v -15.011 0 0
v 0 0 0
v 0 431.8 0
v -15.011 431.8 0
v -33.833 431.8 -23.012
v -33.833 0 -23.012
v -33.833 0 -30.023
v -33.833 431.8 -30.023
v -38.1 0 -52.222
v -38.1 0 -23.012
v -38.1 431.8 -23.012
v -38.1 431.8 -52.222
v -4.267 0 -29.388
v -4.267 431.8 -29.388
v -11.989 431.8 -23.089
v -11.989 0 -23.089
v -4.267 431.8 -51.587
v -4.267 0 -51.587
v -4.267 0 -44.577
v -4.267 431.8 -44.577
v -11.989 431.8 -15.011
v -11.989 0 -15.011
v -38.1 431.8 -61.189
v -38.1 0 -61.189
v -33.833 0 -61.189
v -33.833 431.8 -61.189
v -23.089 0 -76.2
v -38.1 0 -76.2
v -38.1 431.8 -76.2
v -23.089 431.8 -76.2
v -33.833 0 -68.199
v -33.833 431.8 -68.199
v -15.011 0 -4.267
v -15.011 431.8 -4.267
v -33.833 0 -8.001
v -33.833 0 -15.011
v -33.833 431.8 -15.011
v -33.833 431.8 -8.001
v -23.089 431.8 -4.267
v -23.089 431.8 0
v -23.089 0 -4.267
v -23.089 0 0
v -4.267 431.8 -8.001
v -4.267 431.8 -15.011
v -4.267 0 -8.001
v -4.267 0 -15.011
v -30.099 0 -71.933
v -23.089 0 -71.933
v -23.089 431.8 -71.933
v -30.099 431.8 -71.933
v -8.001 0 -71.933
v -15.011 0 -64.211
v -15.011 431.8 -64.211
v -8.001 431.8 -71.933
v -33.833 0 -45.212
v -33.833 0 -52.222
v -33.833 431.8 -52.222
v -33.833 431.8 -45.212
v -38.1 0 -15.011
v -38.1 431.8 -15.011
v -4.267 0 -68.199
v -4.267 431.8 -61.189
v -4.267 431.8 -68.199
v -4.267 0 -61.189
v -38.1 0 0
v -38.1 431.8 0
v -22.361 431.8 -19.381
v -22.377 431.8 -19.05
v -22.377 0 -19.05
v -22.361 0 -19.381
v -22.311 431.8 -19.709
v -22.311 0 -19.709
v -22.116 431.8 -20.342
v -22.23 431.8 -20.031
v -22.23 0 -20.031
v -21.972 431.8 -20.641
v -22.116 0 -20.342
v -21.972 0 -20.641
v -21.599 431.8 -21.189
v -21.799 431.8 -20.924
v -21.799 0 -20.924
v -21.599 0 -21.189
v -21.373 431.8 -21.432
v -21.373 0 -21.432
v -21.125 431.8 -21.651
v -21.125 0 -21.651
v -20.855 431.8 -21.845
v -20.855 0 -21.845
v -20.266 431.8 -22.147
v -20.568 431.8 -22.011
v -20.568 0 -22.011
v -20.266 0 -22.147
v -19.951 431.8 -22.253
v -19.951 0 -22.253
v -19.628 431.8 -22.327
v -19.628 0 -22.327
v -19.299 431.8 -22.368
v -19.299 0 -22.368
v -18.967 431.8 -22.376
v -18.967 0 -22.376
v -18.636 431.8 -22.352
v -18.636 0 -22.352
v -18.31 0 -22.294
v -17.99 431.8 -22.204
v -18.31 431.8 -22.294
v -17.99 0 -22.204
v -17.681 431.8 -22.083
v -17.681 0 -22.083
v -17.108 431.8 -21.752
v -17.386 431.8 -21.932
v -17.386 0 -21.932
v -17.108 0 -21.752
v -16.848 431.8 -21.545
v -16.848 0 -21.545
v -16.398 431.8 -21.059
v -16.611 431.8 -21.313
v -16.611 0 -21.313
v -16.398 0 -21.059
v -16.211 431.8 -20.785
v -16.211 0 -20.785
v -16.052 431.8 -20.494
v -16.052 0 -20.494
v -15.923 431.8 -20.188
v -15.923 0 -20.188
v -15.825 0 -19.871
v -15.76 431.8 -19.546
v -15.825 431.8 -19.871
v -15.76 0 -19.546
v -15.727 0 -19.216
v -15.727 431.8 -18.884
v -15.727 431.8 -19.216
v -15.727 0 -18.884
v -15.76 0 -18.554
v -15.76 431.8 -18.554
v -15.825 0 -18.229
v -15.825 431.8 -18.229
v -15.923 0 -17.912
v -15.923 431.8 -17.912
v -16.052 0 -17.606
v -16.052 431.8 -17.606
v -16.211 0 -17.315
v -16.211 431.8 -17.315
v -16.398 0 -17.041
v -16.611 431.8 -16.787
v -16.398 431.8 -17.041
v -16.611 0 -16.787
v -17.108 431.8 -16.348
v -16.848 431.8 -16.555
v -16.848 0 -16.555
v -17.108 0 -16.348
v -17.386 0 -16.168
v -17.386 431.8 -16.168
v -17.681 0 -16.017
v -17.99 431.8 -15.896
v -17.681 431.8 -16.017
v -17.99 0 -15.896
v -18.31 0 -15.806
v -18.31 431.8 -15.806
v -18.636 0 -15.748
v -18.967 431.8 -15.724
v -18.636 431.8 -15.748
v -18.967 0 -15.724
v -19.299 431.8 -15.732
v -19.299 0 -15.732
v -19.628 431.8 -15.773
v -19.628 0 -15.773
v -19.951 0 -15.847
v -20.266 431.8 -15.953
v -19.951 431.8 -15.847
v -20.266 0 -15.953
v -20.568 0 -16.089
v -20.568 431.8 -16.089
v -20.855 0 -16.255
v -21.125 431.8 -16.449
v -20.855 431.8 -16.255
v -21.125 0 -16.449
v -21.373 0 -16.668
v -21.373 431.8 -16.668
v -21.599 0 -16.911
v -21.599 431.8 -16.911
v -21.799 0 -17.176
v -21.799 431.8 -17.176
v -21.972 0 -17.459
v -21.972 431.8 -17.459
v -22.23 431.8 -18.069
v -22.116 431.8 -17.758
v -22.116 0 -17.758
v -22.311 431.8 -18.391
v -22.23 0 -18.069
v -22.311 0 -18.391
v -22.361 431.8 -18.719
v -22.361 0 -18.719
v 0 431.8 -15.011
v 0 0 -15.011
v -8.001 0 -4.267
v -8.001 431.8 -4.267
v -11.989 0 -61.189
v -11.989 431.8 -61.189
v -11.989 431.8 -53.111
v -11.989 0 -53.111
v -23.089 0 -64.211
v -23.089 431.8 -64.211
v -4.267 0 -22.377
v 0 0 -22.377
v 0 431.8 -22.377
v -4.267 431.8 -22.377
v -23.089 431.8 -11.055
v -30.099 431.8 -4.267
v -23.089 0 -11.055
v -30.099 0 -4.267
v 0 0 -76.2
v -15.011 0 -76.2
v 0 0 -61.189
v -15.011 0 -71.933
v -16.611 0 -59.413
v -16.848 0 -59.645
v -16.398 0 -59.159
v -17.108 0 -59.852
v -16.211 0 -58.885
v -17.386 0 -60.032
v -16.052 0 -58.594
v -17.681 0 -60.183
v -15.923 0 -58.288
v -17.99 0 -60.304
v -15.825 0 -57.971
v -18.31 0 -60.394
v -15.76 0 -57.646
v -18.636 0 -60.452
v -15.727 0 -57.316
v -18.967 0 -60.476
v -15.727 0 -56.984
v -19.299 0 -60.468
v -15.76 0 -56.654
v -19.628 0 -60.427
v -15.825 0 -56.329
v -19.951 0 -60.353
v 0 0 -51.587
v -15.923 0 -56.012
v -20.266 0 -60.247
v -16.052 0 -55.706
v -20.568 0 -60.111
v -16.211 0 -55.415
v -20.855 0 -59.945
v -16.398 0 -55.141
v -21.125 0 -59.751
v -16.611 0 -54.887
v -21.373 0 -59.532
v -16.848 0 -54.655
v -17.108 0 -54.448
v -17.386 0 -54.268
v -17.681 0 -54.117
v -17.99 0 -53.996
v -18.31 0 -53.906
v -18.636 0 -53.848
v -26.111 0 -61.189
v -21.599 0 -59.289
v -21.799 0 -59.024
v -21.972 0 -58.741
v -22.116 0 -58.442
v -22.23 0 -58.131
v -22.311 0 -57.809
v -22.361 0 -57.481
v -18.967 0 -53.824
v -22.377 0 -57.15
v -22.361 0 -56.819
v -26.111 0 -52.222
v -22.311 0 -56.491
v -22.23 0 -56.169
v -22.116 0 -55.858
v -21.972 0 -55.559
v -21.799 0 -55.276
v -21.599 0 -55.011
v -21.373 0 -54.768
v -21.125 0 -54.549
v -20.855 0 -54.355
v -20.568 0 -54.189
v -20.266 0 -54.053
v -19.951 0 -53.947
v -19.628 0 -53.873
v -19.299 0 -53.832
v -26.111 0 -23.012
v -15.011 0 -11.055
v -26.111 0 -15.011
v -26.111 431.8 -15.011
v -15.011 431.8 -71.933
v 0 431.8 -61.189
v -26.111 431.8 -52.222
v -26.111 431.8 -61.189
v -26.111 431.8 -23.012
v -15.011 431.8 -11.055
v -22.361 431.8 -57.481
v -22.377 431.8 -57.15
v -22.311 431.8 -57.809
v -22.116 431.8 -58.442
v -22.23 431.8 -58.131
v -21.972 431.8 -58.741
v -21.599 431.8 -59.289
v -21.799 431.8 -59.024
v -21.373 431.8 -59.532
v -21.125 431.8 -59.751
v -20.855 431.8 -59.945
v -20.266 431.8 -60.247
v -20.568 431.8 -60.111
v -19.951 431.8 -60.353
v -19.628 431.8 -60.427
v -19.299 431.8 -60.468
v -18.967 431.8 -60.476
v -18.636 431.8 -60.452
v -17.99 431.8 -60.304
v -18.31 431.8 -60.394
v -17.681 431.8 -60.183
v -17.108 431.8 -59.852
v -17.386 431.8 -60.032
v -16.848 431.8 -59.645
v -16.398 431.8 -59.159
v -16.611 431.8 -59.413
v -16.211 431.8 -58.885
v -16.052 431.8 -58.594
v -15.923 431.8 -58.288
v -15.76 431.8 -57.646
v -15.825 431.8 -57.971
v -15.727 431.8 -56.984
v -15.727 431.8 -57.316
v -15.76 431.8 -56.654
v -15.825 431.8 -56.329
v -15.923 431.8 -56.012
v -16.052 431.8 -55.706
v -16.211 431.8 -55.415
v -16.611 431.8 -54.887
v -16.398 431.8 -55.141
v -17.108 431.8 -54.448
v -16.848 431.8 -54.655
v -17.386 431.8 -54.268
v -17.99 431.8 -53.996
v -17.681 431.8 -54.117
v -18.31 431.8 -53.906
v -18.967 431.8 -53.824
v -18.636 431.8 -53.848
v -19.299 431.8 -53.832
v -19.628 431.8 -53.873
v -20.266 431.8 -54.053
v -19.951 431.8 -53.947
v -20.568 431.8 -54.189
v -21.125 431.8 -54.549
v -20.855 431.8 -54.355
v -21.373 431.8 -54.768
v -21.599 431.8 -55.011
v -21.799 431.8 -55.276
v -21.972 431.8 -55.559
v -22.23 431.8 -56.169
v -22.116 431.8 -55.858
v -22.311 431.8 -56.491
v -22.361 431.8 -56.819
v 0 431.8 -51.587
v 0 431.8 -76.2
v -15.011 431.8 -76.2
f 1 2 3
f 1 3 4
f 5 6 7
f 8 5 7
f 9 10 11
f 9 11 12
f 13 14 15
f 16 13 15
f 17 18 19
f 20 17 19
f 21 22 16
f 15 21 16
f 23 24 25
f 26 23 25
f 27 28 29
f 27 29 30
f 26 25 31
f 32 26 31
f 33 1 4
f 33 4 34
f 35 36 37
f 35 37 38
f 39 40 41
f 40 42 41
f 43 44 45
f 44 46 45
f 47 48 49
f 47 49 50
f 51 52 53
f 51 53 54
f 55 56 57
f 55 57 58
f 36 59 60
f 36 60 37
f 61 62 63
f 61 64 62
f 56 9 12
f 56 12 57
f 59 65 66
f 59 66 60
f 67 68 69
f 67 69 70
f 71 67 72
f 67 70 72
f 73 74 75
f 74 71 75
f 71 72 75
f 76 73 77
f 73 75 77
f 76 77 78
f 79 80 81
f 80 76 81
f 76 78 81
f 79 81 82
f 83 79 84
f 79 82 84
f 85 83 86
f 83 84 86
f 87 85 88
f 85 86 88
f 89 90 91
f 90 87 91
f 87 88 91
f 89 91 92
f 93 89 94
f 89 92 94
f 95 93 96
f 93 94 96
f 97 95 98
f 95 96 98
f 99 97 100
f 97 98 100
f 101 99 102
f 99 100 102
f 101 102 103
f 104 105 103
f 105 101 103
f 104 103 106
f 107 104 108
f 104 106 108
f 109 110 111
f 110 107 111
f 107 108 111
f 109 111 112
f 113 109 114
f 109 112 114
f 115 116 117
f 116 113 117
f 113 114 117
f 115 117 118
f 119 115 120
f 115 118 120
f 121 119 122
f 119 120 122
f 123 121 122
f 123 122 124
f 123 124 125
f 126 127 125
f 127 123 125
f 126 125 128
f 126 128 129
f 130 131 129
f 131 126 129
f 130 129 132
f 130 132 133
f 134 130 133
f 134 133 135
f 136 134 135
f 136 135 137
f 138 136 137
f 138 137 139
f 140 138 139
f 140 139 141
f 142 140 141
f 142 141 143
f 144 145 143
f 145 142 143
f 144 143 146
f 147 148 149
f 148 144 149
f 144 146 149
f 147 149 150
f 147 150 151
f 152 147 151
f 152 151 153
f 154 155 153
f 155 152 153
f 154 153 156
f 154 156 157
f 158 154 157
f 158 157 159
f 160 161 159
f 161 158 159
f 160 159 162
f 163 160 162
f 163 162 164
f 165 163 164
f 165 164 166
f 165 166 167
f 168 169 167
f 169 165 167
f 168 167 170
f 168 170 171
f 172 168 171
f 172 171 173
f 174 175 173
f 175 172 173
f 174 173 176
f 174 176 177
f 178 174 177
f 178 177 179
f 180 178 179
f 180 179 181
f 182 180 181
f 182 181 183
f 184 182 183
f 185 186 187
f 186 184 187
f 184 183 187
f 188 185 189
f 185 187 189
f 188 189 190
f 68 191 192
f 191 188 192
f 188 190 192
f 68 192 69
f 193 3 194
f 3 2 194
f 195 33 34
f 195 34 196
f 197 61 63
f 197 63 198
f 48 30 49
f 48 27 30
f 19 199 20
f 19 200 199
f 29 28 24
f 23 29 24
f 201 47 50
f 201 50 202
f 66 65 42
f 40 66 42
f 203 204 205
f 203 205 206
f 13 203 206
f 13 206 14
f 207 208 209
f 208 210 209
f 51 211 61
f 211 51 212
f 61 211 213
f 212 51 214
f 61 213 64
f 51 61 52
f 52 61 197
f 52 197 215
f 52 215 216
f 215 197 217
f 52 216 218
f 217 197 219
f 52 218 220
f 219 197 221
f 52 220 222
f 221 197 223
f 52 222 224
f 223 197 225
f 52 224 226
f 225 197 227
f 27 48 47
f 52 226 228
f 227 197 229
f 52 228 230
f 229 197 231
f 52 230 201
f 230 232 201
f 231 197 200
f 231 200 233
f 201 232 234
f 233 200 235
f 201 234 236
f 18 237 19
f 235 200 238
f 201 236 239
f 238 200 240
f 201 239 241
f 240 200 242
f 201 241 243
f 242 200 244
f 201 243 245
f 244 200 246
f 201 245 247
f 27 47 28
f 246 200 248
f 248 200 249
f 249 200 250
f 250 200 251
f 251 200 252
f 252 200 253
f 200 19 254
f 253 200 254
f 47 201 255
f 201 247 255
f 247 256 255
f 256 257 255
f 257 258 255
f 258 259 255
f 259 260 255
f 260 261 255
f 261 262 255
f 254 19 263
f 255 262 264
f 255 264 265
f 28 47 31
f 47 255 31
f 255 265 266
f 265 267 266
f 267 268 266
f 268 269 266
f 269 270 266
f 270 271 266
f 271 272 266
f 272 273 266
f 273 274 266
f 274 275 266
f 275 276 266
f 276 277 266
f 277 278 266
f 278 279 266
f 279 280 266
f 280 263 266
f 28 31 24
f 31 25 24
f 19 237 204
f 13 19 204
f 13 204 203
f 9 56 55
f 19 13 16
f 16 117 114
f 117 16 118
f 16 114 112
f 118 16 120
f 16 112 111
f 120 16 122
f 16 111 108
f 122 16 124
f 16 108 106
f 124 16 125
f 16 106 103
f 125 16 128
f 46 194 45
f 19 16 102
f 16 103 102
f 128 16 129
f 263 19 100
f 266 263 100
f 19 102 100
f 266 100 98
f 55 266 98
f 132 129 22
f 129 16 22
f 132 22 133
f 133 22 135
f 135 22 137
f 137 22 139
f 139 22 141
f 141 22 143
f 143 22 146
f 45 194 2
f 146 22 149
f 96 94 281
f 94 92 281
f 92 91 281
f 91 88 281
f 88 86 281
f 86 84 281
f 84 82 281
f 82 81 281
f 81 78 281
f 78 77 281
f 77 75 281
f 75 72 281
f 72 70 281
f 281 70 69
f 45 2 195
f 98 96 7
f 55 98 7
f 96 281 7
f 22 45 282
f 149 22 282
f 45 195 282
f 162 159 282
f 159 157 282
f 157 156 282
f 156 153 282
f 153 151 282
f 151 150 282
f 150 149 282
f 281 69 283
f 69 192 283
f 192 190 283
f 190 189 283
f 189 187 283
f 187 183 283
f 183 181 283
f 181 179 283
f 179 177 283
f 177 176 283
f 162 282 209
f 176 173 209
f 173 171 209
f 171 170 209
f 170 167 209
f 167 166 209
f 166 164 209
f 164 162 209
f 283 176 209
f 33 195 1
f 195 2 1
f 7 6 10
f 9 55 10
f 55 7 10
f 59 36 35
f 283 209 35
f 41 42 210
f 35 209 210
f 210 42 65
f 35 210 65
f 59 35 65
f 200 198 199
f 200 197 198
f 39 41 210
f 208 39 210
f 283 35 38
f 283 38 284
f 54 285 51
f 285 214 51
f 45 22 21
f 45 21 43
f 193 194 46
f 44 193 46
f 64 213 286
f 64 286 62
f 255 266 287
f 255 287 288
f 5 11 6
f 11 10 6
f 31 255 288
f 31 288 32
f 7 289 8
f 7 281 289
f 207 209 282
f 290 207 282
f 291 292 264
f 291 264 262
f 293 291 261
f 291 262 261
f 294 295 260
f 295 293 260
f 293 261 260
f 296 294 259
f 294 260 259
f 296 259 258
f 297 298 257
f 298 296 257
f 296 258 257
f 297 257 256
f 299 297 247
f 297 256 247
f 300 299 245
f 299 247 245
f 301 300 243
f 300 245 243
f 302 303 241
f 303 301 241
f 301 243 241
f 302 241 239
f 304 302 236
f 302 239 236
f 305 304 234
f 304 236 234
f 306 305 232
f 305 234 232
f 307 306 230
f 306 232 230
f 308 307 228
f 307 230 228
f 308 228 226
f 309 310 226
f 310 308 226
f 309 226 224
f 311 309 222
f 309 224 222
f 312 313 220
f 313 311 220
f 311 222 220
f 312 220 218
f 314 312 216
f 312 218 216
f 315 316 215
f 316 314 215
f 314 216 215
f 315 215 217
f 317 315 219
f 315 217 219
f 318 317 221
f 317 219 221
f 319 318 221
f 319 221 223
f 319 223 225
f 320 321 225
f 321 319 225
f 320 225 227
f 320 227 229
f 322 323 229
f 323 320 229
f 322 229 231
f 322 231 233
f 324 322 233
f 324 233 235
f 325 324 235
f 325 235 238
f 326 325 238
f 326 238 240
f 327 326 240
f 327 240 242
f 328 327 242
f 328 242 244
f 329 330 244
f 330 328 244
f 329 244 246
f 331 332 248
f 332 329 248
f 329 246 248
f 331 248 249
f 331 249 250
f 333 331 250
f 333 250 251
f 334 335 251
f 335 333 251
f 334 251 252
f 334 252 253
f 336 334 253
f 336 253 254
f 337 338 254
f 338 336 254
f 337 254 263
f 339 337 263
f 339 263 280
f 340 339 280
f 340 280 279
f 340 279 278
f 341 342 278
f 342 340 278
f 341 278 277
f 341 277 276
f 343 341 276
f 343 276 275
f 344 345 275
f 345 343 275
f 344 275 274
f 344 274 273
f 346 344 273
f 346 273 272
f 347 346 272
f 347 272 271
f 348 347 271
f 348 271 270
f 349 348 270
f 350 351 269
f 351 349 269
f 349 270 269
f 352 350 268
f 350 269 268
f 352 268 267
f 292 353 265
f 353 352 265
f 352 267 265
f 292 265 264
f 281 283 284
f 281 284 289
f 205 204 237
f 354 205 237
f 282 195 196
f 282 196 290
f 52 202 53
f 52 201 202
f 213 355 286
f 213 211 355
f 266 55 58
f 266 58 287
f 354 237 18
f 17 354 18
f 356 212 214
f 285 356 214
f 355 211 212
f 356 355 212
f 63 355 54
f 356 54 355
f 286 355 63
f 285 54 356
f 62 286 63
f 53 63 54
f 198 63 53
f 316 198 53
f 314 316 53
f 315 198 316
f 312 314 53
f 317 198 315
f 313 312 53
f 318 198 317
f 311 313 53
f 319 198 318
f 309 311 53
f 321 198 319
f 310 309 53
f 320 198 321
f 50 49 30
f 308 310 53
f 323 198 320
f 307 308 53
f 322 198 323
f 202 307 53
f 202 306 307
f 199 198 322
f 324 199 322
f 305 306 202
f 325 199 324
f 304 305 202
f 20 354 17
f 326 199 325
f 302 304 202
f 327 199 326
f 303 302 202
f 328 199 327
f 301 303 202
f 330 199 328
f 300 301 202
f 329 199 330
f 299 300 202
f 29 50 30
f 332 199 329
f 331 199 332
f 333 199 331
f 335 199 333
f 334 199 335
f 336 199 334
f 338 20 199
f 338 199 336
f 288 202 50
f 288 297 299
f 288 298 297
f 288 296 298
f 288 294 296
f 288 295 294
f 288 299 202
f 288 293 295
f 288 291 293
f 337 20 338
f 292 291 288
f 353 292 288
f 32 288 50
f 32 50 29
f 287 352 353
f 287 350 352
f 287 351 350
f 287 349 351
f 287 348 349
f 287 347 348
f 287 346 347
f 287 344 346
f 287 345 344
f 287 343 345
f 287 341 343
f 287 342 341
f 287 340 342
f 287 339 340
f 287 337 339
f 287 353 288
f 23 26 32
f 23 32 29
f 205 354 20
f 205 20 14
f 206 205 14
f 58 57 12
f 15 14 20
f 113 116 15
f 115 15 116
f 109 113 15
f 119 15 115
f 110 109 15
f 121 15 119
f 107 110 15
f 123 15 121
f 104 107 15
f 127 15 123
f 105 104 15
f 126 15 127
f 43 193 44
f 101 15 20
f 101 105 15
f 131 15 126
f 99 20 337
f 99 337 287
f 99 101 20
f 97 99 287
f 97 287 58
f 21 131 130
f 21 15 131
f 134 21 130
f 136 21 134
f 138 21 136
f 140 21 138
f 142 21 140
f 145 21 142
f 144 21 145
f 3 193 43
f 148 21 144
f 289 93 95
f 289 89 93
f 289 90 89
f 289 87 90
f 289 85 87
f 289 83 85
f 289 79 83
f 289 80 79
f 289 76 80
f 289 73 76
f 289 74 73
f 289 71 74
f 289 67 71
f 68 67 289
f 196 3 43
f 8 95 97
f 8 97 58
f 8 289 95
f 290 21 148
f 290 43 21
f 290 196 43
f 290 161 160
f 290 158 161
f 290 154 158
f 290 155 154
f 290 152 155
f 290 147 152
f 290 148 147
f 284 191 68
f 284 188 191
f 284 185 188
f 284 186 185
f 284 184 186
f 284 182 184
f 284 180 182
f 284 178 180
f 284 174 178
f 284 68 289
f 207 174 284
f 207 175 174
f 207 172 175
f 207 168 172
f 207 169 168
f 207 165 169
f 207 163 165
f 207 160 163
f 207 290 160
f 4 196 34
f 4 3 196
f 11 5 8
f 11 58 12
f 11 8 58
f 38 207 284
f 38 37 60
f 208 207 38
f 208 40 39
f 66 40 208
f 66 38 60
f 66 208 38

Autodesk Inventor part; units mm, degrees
ref_plane "YZ Plane" through (0, 0, 0) normal (1, 0, 0) x (0, 1, 0)
ref_plane "XZ Plane" through (0, 0, 0) normal (0, 1, 0) x (-1, 0, 0)
ref_plane "XY Plane" through (0, 0, 0) normal (0, 0, 1) x (1, 0, 0)
sketch "Sketch1" plane through (0, 0, 0) normal (0, 1, 0) x (-1, 0, 0)
  circle A0 centre (19.05, -19.05) radius 3.3274
  circle A1 centre (19.05, -57.15) radius 3.3274
  line L0 (0, 0) -> (15.0114, 0)
  line L1 (15.0114, 0) -> (15.0114, -4.2672)
  line L2 (15.0114, -4.2672) -> (8.001, -4.2672)
  line L3 (38.1, 0) -> (23.0886, 0)
  line L4 (23.0886, 0) -> (23.0886, -4.2672)
  line L5 (23.0886, -4.2672) -> (30.099, -4.2672)
  line L6 (23.0886, -11.0548) -> (15.0114, -11.0548)
  line L7 (30.099, -4.2672) -> (23.0886, -11.0548)
  line L8 (8.001, -4.2672) -> (15.0114, -11.0548)
  line L9 (38.1, 0) -> (38.1, -15.0114)
  line L10 (38.1, -15.0114) -> (33.8328, -15.0114)
  line L11 (33.8328, -15.0114) -> (33.8328, -8.001)
  line L12 (38.1, -76.2) -> (38.1, -61.1886)
  line L13 (38.1, -61.1886) -> (33.8328, -61.1886)
  line L14 (33.8328, -61.1886) -> (33.8328, -68.199)
  line L15 (38.1, -76.2) -> (23.0886, -76.2)
  line L16 (23.0886, -76.2) -> (23.0886, -71.9328)
  line L17 (23.0886, -71.9328) -> (30.099, -71.9328)
  line L18 (38.1, -23.0124) -> (38.1, -52.2224)
  line L19 (38.1, -23.0124) -> (33.8328, -23.0124)
  line L20 (33.8328, -23.0124) -> (33.8328, -30.0228)
  line L21 (38.1, -52.2224) -> (33.8328, -52.2224)
  line L22 (33.8328, -52.2224) -> (33.8328, -45.212)
  line L23 (26.1112, -15.0114) -> (26.1112, -23.0124)
  line L24 (26.1112, -52.2224) -> (26.1112, -61.1886)
  line L25 (33.8328, -8.001) -> (26.1112, -15.0114)
  line L26 (26.1112, -23.0124) -> (33.8328, -30.0228)
  line L27 (33.8328, -45.212) -> (26.1112, -52.2224)
  line L28 (26.1112, -61.1886) -> (33.8328, -68.199)
  line L29 (0, -76.2) -> (15.0114, -76.2)
  line L30 (15.0114, -76.2) -> (15.0114, -71.9328)
  line L31 (15.0114, -71.9328) -> (8.001, -71.9328)
  line L32 (23.0886, -64.2112) -> (15.0114, -64.2112)
  line L33 (15.0114, -64.2112) -> (8.001, -71.9328)
  line L34 (30.099, -71.9328) -> (23.0886, -64.2112)
  line L35 (0, 0) -> (0, -15.0114)
  line L36 (0, -15.0114) -> (4.2672, -15.0114)
  line L37 (4.2672, -15.0114) -> (4.2672, -8.001)
  line L38 (0, -76.2) -> (0, -61.1886)
  line L39 (0, -61.1886) -> (4.2672, -61.1886)
  line L40 (4.2672, -61.1886) -> (4.2672, -68.199)
  line L41 (11.9888, -15.0114) -> (11.9888, -23.0886)
  line L42 (11.9888, -15.0114) -> (4.2672, -8.001)
  line L43 (0, -22.3774) -> (0, -51.5874)
  line L44 (0, -51.5874) -> (4.2672, -51.5874)
  line L45 (4.2672, -51.5874) -> (4.2672, -44.577)
  line L46 (0, -22.3774) -> (4.2672, -22.3774)
  line L47 (4.2672, -22.3774) -> (4.2672, -29.3878)
  line L48 (4.2672, -29.3878) -> (11.9888, -23.0886)
  line L49 (11.9888, -61.1886) -> (11.9888, -53.1114)
  line L50 (4.2672, -68.199) -> (11.9888, -61.1886)
  line L51 (11.9888, -53.1114) -> (4.2672, -44.577)
  dimension "d0" = 38.1
  dimension "d1" = 76.2
  dimension "d2" = 6.6548
  dimension "d3" = 6.6548
  dimension "d8" = 15.0114
  dimension "d9" = 4.2672
  dimension "d10" = 7.0104
  dimension "d11" = 15.0114
  dimension "d12" = 4.2672
  dimension "d13" = 7.0104
  dimension "d14" = 15.0114
  dimension "d15" = 4.2672
  dimension "d16" = 7.0104
  dimension "d17" = 15.0114
  dimension "d18" = 4.2672
  dimension "d19" = 7.0104
  dimension "d20" = 15.0114
  dimension "d21" = 4.2672
  dimension "d22" = 7.0104
  dimension "d23" = 29.21
  dimension "d24" = 7.0104
  dimension "d25" = 4.2672
  dimension "d26" = 7.0104
  dimension "d27" = 8.001
  dimension "d28" = 11.9888
  dimension "d29" = 8.9662
  dimension "d32" = 11.9888
  dimension "d33" = 15.0114
  dimension "d34" = 4.2672
  dimension "d35" = 7.0104
  dimension "d36" = 11.9888
  dimension "d37" = 76.2
  dimension "d38" = 15.0114
  dimension "d39" = 4.2672
  dimension "d40" = 90
  dimension "d41" = 7.0104
  dimension "d42" = 15.0114
  dimension "d43" = 7.0104
  dimension "d44" = 8.0772
  dimension "d45" = 11.9888
  dimension "d46" = 29.21
  dimension "d47" = 7.0104
  dimension "d48" = 7.0104
  dimension "d49" = 8.0772
  dimension "d50" = 11.9888
extrude "Extrusion1" add sketch "Sketch1" along normal blind 431.8
properties part number "1530rail_17inch"
